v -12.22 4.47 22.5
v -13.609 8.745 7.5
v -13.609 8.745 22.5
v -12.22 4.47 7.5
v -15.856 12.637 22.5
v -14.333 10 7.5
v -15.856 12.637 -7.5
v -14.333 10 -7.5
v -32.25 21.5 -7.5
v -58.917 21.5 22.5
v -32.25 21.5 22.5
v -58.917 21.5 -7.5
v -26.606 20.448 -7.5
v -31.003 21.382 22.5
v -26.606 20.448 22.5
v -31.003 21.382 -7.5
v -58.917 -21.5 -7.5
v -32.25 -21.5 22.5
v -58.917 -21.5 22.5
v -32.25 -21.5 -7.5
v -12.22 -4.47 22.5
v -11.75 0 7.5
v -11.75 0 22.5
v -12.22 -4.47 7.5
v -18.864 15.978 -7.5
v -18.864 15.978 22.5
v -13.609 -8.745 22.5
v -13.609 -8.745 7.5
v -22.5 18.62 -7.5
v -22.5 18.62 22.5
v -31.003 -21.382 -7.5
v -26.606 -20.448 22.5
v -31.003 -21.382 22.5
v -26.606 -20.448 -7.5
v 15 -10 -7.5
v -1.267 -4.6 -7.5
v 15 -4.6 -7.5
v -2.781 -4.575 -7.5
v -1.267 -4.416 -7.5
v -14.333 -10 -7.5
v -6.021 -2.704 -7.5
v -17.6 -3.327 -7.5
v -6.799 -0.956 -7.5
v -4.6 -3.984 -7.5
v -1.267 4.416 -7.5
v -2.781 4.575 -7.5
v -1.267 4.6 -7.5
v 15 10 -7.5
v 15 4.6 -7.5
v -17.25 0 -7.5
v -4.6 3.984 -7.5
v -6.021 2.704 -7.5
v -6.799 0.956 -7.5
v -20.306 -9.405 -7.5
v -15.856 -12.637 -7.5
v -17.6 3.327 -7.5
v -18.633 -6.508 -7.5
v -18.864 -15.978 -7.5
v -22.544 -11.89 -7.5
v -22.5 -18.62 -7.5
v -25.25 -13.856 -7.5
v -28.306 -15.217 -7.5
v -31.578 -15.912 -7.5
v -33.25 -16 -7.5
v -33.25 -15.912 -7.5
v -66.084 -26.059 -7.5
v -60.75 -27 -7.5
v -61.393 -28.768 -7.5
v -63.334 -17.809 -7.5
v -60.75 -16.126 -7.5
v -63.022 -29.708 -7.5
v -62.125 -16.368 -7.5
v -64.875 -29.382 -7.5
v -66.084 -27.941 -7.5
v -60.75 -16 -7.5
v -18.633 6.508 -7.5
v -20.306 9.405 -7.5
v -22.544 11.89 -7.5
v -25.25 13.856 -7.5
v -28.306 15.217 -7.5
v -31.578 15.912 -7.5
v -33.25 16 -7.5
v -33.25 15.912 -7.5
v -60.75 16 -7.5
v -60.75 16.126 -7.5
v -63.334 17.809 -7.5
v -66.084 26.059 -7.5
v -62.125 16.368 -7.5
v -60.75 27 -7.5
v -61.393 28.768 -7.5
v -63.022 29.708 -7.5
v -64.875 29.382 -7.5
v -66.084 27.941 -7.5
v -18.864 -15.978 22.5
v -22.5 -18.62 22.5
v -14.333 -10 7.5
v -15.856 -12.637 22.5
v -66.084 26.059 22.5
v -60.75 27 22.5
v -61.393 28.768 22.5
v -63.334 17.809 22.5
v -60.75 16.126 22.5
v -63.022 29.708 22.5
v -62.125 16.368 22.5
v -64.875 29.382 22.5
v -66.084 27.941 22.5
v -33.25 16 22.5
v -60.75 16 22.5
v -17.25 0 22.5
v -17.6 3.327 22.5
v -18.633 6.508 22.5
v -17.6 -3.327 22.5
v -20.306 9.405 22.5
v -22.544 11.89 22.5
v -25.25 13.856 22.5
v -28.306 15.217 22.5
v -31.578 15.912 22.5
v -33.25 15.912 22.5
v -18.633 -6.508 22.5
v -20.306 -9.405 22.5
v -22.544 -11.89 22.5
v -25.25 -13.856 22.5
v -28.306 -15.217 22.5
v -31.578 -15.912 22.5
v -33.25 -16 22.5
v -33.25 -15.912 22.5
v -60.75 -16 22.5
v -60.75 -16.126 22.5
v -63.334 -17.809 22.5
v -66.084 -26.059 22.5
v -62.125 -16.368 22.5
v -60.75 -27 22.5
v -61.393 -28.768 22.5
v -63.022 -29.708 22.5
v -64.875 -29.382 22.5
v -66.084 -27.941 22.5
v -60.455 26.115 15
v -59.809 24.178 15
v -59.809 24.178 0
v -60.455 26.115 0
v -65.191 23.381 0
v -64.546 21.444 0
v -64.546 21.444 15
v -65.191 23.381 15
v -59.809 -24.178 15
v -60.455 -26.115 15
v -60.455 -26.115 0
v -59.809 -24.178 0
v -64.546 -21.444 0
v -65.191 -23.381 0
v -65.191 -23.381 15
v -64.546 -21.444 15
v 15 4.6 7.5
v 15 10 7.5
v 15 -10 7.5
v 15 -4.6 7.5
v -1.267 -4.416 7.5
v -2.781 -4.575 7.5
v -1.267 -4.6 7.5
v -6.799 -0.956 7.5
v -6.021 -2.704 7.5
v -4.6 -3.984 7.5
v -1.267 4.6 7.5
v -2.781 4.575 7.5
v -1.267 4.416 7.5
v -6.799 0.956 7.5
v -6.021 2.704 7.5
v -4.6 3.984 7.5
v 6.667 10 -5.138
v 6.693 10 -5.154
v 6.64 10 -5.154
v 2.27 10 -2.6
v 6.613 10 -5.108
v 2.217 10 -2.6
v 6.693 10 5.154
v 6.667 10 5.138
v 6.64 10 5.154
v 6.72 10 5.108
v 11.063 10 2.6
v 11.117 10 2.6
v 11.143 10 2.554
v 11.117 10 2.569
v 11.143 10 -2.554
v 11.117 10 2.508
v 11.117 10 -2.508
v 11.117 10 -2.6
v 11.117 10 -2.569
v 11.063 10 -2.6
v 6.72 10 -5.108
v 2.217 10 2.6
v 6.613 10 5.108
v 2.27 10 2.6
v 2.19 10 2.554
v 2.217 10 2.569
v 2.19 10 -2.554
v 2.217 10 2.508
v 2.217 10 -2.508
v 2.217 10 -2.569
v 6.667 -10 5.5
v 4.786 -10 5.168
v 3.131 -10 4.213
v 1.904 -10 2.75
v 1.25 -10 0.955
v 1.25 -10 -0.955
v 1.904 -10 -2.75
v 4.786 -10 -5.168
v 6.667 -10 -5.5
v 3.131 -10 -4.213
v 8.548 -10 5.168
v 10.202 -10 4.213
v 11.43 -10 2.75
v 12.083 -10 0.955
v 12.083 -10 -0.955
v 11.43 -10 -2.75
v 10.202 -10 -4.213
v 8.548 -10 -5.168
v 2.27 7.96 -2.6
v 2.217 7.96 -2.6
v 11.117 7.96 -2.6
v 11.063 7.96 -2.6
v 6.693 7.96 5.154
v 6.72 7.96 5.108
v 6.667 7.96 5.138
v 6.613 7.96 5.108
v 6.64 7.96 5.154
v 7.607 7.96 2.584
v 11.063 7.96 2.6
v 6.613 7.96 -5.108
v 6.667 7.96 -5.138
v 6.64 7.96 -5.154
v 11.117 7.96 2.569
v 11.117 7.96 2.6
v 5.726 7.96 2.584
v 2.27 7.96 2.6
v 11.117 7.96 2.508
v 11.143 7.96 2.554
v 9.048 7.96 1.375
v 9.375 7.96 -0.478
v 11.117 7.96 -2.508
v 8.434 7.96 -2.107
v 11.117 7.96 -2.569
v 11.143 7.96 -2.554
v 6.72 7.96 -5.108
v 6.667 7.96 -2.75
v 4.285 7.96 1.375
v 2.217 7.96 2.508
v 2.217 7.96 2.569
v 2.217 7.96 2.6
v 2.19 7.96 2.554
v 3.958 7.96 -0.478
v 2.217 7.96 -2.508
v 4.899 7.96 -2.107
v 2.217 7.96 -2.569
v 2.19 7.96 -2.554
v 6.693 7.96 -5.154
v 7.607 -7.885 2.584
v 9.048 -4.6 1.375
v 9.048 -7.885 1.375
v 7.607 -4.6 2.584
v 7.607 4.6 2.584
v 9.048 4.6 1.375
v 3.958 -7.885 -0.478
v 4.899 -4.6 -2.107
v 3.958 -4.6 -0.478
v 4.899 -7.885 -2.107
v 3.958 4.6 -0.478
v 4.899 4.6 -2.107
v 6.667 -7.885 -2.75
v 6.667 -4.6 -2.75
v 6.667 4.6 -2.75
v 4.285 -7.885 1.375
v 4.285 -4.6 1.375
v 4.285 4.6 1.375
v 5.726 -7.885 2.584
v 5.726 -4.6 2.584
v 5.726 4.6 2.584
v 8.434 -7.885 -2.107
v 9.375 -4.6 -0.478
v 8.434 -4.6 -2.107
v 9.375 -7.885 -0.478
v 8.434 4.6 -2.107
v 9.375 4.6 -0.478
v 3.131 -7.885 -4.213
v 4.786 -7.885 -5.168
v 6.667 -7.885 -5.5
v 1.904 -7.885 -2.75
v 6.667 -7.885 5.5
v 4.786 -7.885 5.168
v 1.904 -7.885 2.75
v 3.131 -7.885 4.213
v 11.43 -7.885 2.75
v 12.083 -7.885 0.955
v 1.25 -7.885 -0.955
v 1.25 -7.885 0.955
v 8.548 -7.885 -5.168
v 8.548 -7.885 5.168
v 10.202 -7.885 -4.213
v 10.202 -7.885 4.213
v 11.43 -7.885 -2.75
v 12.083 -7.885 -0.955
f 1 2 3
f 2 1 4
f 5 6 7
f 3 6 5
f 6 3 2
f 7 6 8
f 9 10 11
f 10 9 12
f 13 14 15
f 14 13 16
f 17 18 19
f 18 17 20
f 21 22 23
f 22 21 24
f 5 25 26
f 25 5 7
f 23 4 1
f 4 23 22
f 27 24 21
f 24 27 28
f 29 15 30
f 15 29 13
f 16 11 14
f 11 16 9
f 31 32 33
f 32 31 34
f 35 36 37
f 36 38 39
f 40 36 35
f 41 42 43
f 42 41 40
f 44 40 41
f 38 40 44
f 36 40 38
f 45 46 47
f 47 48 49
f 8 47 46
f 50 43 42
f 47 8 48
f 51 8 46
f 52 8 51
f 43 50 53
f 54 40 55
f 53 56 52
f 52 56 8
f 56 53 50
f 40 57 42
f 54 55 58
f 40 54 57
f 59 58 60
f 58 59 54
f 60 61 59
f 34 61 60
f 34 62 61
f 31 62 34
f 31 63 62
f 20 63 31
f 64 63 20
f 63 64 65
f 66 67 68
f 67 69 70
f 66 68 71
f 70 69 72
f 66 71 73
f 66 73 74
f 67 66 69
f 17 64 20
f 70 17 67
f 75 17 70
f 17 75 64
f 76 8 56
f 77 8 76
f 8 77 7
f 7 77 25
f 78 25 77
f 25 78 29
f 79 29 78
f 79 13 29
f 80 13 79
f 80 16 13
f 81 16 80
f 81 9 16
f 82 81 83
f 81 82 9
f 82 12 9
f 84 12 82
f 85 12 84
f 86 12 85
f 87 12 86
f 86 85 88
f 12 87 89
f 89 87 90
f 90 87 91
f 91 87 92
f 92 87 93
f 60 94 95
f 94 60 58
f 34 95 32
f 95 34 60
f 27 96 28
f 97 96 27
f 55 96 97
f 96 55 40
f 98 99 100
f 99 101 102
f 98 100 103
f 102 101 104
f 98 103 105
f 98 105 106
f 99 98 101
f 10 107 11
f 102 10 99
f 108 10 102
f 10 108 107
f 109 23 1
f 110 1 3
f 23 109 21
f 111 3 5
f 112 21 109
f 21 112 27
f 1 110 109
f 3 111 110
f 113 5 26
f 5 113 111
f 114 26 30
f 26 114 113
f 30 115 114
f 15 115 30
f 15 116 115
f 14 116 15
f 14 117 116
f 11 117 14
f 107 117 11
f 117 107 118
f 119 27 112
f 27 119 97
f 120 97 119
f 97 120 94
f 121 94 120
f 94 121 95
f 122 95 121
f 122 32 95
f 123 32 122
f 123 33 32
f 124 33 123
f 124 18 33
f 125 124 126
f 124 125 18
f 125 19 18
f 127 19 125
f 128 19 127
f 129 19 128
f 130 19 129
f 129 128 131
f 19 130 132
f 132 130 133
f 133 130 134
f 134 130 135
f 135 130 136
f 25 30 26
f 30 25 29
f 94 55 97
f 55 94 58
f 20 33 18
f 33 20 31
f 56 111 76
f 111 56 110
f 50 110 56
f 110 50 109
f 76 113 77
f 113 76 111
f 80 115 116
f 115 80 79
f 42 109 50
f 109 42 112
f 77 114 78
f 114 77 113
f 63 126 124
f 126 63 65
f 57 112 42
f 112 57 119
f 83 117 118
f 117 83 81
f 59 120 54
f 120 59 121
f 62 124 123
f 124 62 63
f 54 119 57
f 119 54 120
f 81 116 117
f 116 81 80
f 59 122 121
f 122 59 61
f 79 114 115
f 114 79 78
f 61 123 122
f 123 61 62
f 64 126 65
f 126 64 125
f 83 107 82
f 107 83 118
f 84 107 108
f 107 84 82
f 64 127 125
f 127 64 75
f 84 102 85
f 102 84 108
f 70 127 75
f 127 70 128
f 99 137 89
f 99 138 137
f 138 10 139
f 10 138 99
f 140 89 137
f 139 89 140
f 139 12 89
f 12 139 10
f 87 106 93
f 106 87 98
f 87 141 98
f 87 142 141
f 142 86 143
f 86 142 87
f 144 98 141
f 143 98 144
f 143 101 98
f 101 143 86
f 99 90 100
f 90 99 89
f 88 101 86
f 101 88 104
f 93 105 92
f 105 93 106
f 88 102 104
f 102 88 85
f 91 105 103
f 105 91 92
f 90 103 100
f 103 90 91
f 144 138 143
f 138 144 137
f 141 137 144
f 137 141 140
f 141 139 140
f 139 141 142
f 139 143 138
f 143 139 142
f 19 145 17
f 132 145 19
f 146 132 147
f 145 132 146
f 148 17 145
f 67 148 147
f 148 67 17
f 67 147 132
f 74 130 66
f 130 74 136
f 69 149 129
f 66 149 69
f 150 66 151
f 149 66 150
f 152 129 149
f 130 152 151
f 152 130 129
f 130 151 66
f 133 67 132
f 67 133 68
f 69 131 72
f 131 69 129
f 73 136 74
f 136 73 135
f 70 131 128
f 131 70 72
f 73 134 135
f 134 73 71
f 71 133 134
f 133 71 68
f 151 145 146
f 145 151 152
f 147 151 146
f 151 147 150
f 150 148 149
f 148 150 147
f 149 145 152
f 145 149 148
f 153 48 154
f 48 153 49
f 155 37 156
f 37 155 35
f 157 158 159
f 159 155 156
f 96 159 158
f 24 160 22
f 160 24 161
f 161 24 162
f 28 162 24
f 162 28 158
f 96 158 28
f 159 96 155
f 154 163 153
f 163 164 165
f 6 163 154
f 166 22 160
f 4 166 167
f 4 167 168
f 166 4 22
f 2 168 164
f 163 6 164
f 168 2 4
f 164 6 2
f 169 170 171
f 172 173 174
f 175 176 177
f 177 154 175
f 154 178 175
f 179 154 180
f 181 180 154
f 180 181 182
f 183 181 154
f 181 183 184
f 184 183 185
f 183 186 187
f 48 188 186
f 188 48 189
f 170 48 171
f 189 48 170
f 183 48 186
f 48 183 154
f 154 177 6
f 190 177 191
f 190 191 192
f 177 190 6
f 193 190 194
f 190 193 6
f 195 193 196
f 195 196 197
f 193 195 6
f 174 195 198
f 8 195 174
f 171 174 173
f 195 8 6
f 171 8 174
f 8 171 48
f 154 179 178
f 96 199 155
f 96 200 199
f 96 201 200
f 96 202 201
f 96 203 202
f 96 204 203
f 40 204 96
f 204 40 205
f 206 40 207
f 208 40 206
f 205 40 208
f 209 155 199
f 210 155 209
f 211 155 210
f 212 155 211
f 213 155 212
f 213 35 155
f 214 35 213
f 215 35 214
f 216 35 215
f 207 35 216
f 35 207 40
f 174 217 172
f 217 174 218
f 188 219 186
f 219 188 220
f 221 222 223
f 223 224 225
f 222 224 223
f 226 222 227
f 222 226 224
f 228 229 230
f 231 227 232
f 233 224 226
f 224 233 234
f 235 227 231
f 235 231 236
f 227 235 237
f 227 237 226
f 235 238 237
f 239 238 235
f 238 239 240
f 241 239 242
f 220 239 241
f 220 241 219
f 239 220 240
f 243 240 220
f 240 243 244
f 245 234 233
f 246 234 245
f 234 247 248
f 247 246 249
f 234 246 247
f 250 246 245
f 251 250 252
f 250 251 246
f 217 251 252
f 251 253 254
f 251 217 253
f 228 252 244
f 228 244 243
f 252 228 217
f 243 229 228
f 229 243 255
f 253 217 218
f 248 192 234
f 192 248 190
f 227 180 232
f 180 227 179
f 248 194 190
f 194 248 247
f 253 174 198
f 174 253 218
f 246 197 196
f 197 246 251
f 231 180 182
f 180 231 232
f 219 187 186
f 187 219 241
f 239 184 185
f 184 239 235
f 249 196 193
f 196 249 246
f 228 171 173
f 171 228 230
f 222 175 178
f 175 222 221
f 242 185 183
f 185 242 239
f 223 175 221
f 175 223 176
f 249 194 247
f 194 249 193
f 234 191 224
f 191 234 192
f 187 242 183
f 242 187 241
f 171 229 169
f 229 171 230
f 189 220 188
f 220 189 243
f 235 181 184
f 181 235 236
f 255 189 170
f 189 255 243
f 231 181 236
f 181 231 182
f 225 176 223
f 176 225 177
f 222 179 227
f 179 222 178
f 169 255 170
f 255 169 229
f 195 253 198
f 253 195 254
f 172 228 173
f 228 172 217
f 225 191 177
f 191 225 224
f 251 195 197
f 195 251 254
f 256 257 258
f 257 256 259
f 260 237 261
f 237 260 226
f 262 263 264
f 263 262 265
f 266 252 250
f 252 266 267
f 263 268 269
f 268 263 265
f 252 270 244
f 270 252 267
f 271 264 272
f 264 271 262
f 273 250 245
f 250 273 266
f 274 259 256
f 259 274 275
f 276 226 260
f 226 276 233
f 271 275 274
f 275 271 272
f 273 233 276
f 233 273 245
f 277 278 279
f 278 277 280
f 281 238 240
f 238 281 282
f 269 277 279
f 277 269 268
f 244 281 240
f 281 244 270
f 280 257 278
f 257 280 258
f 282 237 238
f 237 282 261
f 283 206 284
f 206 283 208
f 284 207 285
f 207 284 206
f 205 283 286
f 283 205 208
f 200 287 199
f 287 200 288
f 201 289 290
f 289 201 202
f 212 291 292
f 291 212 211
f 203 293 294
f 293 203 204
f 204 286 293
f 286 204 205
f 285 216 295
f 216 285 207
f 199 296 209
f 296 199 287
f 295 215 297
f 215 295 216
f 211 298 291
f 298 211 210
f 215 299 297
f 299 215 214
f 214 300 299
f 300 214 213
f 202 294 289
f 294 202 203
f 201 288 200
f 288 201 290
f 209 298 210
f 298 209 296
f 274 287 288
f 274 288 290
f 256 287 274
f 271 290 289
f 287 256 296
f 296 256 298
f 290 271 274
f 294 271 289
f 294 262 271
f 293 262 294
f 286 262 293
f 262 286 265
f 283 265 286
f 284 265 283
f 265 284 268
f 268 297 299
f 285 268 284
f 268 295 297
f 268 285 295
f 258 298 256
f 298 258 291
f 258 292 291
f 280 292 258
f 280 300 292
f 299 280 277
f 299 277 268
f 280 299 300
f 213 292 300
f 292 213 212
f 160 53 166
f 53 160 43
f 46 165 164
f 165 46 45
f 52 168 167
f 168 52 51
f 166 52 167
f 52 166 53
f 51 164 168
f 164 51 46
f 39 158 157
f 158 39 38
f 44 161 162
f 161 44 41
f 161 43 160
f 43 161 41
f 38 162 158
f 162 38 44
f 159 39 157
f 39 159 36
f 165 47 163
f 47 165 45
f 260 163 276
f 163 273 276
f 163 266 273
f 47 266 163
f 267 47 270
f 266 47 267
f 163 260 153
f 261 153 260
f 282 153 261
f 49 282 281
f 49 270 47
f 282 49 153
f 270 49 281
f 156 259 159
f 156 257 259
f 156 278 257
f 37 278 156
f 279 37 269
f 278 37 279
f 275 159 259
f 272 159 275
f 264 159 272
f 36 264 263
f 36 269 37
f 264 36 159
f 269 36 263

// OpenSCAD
/*All in one yoke*/

// Length of yoke
yokeLength = 55;

// Width of the yoke opening
yokeWidth = 32;

// Thickness of the yoke arms
yokeThickness = 5.5;

// YokeHeight
yokeHeight = 30;

// Strap Slot Thickness
strapThickness = 2;

// Strap Slot Height
strapHeight = 15;

///Expert Options Below///
// height of the arm
armHeight = 15;

// Overall width of the attachment arm
armAttachWidth = 20;

// bolt diameter
boltDiameter = 5.5;

// armSlotWidth
armSlotWidth = 9.2;
///////////////////////////
module strapHolder()
{
    translate([ -yokeLength / 2, yokeWidth / 2 + yokeThickness / 2, 0 ])
    {
        difference()
        {
            hull()
            {
                translate([ -yokeThickness / 2, yokeThickness * 1.5, 0 ]) cylinder(yokeHeight, yokeThickness / 2, yokeThickness / 2);
                cylinder(yokeHeight, yokeThickness / 2, yokeThickness / 2);
            }
            rotate([ 0, 0, 30 ])
            {
                translate([ -yokeThickness * 2, yokeThickness / 1.3, yokeHeight / 2 - strapHeight / 2 ])
                {
                    cube([ yokeLength, strapThickness, strapHeight ]);
                }
            }
        }
    }
}

module ovalTube()
{
    difference()
    {
        hull()
        {
            cylinder(yokeHeight, yokeWidth / 2 + yokeThickness, yokeWidth / 2 + yokeThickness);
            translate([ -yokeWidth + yokeThickness, 0, yokeHeight / 2 ])
            {
                cube([ yokeLength, yokeWidth + yokeThickness * 2, yokeHeight ], true);
            }
        }
        // middle of yoke
        cylinder(yokeHeight + 5, yokeWidth / 2, yokeWidth / 2);
        translate([ -yokeLength / 2, 0, yokeHeight / 2 ])
        {
            cube([ yokeLength, yokeWidth, yokeHeight + 5 ], true);
        }
        // end cut
        translate([ -yokeLength, 0, yokeHeight / 2 ])
        {
            cube([ yokeLength, yokeWidth * 2, yokeHeight + 5 ], true);
        }
    }
}

difference()
{
    union()
    {
        // main attach point
        translate([ 0, 0, 0 ])
        {
            cube([ armAttachWidth * 1.5, armAttachWidth, armHeight ], true);
            // radius above hook
        }
        // yoke
        translate([ -armAttachWidth - yokeWidth / 2 + yokeThickness / 2, 0, -armHeight / 2 ])
        {
            ovalTube();
            strapHolder();
            mirror([ 0, 1, 0 ]) strapHolder();
        }
    }

    // bolt hole
    translate([ armAttachWidth / 3, 0, 0 ])
    {
        rotate([ 0, 90, 90 ])
        {
            cylinder(armHeight * 4, boltDiameter / 2, boltDiameter / 2, true);
            // head recess
            translate([ 0, 0, -armAttachWidth / 1.3 ])
            {
                cylinder(armHeight, boltDiameter, boltDiameter, true);
            }
            // Nut recess
            translate([ 0, 0, armAttachWidth / 1.3 ])
            {
                cube([ 5.2, 8.9, boltDiameter * 2.7 ], true);
                rotate([ 00, 00, 60 ])
                {
                    cube([ 5.2, 8.9, boltDiameter * 2.7 ], true);
                }
                rotate([ 0, 0, 120 ])
                {
                    cube([ 5.2, 8.9, boltDiameter * 2.7 ], true);
                }
            }
        }
    }

    // hook hole
    translate([ -armSlotWidth / 4, 0, 0 ])
    {
        cylinder(armHeight + 2, armSlotWidth / 2, armSlotWidth / 2, true);
    }

    // hook slot
    translate([ armAttachWidth / 1.5, 0, 0 ])
    {
        cube([ armAttachWidth + armSlotWidth, armSlotWidth, armHeight + 2 ], true);
    }
}
